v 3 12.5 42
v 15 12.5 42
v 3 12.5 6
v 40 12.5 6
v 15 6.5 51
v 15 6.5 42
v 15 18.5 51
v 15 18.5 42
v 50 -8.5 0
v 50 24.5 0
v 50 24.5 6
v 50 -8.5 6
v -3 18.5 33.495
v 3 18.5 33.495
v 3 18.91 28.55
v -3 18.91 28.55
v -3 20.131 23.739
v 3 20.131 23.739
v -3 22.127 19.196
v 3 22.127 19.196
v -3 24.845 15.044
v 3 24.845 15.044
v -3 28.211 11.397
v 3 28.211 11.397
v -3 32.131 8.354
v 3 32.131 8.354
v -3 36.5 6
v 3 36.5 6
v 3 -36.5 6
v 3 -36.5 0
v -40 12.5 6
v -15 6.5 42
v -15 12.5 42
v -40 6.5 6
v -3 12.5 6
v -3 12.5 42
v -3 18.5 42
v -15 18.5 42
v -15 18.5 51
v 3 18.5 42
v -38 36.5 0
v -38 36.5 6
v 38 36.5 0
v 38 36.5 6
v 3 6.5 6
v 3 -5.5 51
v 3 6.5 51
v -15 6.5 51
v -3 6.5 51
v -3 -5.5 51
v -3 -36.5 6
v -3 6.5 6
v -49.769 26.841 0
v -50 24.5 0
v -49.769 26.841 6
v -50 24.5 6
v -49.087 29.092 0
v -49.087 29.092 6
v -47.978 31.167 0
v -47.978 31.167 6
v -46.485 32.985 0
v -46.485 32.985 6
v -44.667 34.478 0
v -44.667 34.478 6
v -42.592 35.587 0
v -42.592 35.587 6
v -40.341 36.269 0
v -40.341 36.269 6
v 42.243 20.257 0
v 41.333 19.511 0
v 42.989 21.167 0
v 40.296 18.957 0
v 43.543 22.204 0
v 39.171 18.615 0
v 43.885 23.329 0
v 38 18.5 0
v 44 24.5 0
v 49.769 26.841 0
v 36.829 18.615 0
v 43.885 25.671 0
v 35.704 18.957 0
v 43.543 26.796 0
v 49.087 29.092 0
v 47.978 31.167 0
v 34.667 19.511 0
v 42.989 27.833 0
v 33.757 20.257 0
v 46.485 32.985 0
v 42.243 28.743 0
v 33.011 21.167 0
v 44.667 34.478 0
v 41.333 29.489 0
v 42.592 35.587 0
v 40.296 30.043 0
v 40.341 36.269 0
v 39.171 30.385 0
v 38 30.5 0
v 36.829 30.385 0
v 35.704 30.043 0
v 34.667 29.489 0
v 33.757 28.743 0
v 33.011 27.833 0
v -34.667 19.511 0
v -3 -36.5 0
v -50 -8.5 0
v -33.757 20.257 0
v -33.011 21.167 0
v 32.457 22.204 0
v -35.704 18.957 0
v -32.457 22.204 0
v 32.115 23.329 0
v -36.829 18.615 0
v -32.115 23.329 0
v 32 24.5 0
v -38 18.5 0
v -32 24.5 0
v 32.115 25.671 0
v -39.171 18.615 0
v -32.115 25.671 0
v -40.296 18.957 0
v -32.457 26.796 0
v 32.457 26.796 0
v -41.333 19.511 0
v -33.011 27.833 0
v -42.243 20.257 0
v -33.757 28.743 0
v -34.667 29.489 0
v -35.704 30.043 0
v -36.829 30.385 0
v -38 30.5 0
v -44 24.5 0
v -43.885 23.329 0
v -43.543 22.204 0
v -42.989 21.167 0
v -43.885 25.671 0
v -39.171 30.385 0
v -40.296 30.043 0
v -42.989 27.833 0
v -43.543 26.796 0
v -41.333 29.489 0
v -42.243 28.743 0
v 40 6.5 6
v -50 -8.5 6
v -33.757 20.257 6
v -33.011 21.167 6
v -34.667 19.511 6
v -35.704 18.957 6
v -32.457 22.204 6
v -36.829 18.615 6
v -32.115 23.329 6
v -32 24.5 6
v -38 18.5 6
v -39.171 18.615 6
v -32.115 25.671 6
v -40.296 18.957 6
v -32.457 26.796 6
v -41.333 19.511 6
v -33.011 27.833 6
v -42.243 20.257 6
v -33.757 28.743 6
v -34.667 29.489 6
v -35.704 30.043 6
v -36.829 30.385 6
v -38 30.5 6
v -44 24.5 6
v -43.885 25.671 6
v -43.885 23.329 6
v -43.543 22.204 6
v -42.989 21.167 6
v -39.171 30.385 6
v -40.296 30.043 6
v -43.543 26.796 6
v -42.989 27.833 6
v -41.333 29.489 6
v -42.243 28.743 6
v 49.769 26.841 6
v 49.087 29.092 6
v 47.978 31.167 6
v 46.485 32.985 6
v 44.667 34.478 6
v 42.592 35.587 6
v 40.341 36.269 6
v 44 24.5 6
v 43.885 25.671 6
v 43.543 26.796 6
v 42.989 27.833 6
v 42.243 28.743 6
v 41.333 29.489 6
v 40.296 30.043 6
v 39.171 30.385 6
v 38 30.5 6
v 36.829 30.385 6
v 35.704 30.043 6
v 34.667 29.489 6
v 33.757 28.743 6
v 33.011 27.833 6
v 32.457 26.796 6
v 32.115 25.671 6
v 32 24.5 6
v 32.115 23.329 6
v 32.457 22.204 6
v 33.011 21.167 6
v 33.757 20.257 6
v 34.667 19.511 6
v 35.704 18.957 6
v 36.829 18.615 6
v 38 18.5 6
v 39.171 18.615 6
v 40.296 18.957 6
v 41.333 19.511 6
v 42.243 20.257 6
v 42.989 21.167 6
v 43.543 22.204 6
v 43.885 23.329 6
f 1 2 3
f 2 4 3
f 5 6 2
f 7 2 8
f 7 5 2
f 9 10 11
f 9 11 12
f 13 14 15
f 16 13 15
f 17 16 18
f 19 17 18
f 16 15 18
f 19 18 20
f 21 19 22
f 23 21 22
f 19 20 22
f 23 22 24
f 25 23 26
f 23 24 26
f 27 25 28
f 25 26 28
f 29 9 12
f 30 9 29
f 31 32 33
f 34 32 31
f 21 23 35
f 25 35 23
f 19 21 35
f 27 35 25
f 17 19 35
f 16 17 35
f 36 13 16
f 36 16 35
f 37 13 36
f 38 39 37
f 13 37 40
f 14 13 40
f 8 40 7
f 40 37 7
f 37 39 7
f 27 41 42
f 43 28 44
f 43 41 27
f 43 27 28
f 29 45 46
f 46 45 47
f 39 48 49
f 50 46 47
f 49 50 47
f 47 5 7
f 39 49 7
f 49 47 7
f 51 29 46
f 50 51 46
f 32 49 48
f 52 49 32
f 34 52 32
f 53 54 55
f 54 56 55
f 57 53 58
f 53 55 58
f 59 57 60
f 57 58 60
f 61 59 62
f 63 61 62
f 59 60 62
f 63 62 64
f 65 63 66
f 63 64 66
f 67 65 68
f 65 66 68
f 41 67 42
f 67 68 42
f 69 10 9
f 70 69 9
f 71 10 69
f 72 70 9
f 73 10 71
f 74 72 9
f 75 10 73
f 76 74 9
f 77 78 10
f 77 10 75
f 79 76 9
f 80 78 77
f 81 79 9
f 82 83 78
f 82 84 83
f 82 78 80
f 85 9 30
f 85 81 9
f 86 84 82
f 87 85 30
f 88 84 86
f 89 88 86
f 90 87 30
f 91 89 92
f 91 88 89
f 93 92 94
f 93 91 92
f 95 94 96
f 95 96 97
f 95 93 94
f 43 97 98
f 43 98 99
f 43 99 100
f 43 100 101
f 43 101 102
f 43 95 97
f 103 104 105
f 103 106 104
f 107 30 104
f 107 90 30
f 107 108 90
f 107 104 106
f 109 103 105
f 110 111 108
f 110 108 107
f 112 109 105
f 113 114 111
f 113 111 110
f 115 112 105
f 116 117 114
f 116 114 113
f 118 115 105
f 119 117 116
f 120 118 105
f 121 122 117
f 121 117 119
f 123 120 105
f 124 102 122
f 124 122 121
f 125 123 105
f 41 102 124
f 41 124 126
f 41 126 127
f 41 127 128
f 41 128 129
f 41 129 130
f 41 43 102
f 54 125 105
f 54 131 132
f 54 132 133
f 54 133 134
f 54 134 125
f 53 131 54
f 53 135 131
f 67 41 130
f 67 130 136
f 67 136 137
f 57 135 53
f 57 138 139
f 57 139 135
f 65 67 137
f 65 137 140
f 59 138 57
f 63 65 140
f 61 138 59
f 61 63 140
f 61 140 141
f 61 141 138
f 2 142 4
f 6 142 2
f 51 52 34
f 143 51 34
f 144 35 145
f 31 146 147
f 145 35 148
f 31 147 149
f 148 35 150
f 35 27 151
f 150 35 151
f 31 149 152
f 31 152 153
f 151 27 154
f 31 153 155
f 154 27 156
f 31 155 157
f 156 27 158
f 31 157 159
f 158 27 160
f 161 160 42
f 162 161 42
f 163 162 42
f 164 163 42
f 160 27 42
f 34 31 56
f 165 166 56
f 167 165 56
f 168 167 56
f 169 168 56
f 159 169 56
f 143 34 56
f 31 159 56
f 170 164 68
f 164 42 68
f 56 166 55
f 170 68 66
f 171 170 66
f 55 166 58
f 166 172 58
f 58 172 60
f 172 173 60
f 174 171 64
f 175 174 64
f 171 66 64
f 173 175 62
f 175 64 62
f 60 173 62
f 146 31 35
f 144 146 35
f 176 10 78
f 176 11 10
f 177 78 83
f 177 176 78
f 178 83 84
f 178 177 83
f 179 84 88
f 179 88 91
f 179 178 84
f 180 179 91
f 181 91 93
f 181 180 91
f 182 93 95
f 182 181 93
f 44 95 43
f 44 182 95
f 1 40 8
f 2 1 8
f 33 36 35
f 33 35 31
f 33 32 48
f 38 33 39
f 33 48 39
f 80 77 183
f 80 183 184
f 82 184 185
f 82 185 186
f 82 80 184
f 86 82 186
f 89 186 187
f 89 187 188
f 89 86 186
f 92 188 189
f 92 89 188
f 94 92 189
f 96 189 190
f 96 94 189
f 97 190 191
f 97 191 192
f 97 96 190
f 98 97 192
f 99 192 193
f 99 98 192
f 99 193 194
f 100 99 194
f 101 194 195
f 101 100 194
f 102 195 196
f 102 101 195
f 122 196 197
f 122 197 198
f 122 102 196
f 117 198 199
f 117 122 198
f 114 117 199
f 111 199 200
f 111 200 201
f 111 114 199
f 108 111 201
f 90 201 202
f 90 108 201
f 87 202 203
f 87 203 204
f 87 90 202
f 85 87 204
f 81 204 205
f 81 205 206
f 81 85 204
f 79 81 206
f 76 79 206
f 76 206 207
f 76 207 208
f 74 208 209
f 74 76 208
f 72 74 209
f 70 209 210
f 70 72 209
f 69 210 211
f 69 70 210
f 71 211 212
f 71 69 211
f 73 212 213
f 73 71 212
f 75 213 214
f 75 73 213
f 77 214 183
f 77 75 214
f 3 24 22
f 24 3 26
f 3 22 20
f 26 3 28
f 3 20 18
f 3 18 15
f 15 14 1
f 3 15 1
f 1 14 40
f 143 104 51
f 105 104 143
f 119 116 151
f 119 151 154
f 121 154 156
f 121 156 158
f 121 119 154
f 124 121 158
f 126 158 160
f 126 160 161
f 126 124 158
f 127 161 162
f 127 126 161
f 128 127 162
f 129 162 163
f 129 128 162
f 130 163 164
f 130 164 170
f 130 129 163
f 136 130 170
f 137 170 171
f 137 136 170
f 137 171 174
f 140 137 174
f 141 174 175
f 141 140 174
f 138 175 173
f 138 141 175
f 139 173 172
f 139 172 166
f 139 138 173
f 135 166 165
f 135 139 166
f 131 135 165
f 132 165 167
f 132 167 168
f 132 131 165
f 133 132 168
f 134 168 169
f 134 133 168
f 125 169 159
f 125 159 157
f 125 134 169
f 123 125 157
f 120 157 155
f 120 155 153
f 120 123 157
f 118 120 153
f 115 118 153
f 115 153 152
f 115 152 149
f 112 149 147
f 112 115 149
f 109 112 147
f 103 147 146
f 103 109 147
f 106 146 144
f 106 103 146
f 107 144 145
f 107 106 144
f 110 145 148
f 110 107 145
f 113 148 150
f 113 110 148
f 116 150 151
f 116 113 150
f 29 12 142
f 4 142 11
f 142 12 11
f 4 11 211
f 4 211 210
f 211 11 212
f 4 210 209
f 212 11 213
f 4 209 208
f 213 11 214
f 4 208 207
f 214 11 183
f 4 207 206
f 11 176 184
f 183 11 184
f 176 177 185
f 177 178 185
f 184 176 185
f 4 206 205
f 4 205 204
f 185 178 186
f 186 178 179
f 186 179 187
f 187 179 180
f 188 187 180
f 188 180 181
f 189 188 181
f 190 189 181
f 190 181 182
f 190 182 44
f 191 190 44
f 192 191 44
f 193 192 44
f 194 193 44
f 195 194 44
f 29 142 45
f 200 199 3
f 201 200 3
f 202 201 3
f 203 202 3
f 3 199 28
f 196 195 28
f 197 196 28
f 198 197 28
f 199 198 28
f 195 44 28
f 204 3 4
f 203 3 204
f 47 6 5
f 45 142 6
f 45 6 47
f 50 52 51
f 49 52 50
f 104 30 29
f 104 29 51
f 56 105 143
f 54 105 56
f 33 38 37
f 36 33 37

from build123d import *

# Parameters (mm, degrees)
BOSS_EXTRUDE1_DEPTH = 6
SKETCH3_W           = 30
SKETCH3_H           = 12
BOSS_EXTRUDE2_DEPTH = 9
BOSS_EXTRUDE3_DEPTH = 6
RIB1_START          = -3
RIB1_DEPTH          = 6
RIB2_START          = -3
RIB2_DEPTH          = 6
SKETCH9_R           = 6
CUT_EXTRUDE1_DEPTH  = 6
FILLET1_R           = 12


# Read off the part's stored shape, not the designer's step: Rib1, Rib2
with BuildPart() as part:
    # Sketch1 → Boss-Extrude1 (new body)
    with BuildSketch(Plane.XY):
        Polygon((-50, 36.5), (50, 36.5), (50, -8.5), (3, -36.5), (-3, -36.5), (-50, -8.5), align=None)
    extrude(amount=BOSS_EXTRUDE1_DEPTH)



with BuildPart() as body_2:
    # Sketch3 → Boss-Extrude2 (new body)
    with BuildSketch(Plane.XY.offset(51)):
        with Locations((0, 12.5)):
            Rectangle(SKETCH3_W, SKETCH3_H)
    extrude(amount=-BOSS_EXTRUDE2_DEPTH)


with BuildPart() as part_1:
    add(part.part)

    add(body_2.part)  # Boss-Extrude3 merges body 2
    # Sketch5 → Boss-Extrude3 (add)
    with BuildSketch(Plane(origin=(0, 6.5, 0), x_dir=(-1, 0, 0), z_dir=(0, -1, 0))):
        Polygon((15, -42), (40, -6), (-40, -6), (-15, -42), align=None)
    extrude(amount=-BOSS_EXTRUDE3_DEPTH)

    # Rib1 outline → Rib1 (add)
    with BuildSketch(Plane.ZY.offset(RIB1_START)):
        Polygon((6, -36.5), (51, -5.5), (51, 6.5), (6, 6.5), align=None)
    extrude(amount=RIB1_DEPTH)

    # Rib2 outline → Rib2 (add)
    with BuildSketch(Plane.ZY.offset(RIB2_START)):
        with BuildLine():
            Line((42, 12.5), (42, 18.5))
            Line((42, 18.5), (33.49545417, 18.5))
            ThreePointArc((33.49545417, 18.5), (17.063777445, 23.400199204), (6, 36.5))
            Line((6, 36.5), (6, 12.5))
            Line((6, 12.5), (42, 12.5))
        make_face()
    extrude(amount=RIB2_DEPTH)

    # Sketch9 → Cut-Extrude1 (cut)
    with BuildSketch(Plane.XY):
        with Locations((-38, 24.5)):
            Circle(SKETCH9_R)
        with Locations((38, 24.5)):
            Circle(SKETCH9_R)
    extrude(amount=CUT_EXTRUDE1_DEPTH, mode=Mode.SUBTRACT)

    # Fillet1
    fillet1_edges = [part_1.edges().sort_by_distance(p)[0] for p in [
        (-50, 36.5, 3),
        (50, 36.5, 3),
    ]]
    fillet(fillet1_edges, radius=FILLET1_R)


solid = part_1.part
